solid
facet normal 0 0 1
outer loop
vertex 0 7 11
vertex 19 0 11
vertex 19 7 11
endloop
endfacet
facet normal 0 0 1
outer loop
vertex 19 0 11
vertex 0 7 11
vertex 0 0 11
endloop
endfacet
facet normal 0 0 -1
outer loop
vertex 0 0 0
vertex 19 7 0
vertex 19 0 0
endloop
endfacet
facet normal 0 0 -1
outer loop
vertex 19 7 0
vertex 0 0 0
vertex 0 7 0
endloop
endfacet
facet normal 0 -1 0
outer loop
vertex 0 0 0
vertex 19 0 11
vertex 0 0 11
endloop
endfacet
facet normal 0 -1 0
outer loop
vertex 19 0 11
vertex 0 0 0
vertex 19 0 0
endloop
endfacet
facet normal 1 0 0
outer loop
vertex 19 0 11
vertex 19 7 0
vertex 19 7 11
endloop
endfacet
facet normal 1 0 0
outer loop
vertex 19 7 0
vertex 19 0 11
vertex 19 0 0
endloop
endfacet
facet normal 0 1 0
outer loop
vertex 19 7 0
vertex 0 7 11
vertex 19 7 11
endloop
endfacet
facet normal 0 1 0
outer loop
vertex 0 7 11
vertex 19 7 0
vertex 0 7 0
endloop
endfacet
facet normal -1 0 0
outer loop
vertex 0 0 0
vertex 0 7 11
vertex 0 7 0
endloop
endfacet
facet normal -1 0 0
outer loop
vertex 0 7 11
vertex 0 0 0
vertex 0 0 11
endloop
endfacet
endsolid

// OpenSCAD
// Generated by SolidPython 1.0.1 on 2020-07-29 00:46:56


cube(size = [19, 7, 11]);
/***********************************************
*********      SolidPython code:      **********
************************************************
 
# import packages: SolidPython
from solid import *
from solid.utils import *
from itertools import chain, combinations, permutations


class Resize:

    def __init__(self, scad_file):
        self.scad_file = scad_file
        #self.scad_file = import_scad(scad_file)
        # cone/cylinder param:
        self.r1 = 0
        self.r2 = 0
        self.h = 0
        # rectangular prism param:
        self.w = 0
        self.l = 0
        # ellipse param:
        self.r = 0

    # import OpenScad code (file name corresponds to shape)


    # classify shape + parameters
    def assign(self, param1, param2, param3):
        if self.scad_file == 'cone.scad':
            self.r1 = param1
            self.r2 = param2
            self.h = param3
        elif self.scad_file == 'cylinder.scad':
            self.r1 = param1
            self.r2 = param2
            self.h = param3
        elif self.scad_file == 'rectangularPrism.scad':
            self.h = param1
            self.l = param2
            self.w = param3
        else:
            self.r = param1
            self.h = param2

    # resize parameters
    def iterate(self):
        x = range(3, 20, 2)
        i = 1
        if self.scad_file == 'cone.scad':
            tempList = list(permutations(x, 2))
            for temp in tempList:
                param1 = temp[0]
                param2 = temp[1]
                filepath = 'produced_scad_files/' + 'cone' + str(param1) + '_' + str(param2) + '_' + '.scad'
                scad_render_to_file(cylinder(h=param1, r1=param2, r2=0), filepath)

        elif self.scad_file == 'cylinder.scad':
            tempList = list(permutations(x, 3))
            for temp in tempList:
                param1 = temp[0]
                param2 = temp[1]
                filepath = 'produced_scad_files/' + 'cylinder' + str(param1) + '_' + str(param2) + '_' + '.scad'
                scad_render_to_file(cylinder(h=param1, r1=param2, r2=param2), filepath)

        elif self.scad_file == 'rectangularPrism.scad':
            tempList = list(permutations(x, 3))
            for temp in tempList:
                param1 = temp[0]
                param2 = temp[1]
                param3 = temp[2]
                filepath = 'produced_scad_files/' + 'rectangularPrism' + str(param1) + '_' + str(param2) + '_' + str(
                    param3) + '.scad'
                scad_render_to_file(cube(size=(param1, param2, param3)), filepath)

        elif self.scad_file == 'ellipse.scad':
            tempList = list(permutations(x, 4))
            for temp in tempList:
                param1 = temp[0]
                param2 = temp[1]
                param3 = temp[2]
                param4 = temp[3]
                filepath = 'produced_scad_files/' + 'ellipse' + str(param1) + '_' + str(param2) + '_' + str(param3) + '_' + str(param4) + '.scad'
                scad_render_to_file(scale([param1, param2, param3])(sphere(r=param4)), filepath)

    def render_to_scadfile(self):
        scad_render_to_file(scad, 'example.scad') 
 
************************************************/
